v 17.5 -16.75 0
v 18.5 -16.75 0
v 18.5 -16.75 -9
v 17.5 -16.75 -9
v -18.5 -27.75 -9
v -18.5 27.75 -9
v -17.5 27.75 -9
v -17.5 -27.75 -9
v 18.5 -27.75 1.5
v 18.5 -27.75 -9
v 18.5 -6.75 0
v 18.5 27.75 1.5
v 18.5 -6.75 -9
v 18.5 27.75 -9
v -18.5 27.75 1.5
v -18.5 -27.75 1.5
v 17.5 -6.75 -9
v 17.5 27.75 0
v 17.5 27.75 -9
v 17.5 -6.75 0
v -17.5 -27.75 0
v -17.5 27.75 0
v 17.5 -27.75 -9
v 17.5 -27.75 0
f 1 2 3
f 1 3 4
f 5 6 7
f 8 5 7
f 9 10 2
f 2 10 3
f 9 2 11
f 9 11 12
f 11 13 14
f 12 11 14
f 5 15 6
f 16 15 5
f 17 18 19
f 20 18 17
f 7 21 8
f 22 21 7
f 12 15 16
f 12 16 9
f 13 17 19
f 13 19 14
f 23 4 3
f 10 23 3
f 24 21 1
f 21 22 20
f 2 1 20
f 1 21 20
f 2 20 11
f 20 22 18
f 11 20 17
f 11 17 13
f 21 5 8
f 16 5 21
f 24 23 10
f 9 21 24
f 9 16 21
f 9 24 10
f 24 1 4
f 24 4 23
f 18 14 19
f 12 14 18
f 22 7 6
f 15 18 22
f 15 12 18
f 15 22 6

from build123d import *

# Parameters (mm, degrees)
F0_W     = 1
F0_H     = 10
F1_DEPTH = 1.5
F2_DEPTH = 9


with BuildPart() as f1:
    # F0 (on Top) → F1 (new body)
    with BuildSketch(Plane.XY):
        Polygon((-17.5, 26.75), (0, 26.75), (17.5, 26.75), (17.5, 27.75), (0, 27.75), (-17.5, 27.75), align=None)
        Polygon((-17.5, 0), (-17.5, 26.75), (-17.5, 27.75), (-18.5, 27.75), (-18.5, -27.75), (-17.5, -27.75), (-17.5, -26.75), align=None)
        Polygon((17.5, 26.75), (0, 26.75), (-17.5, 26.75), (-17.5, 0), (-17.5, -26.75), (0, -26.75), (17.5, -26.75), (17.5, -16.75), (17.5, -6.75), (17.5, 0), align=None)
        Polygon((0, -26.75), (-17.5, -26.75), (-17.5, -27.75), (0, -27.75), (17.5, -27.75), (17.5, -26.75), align=None)
        Polygon((17.5, 27.75), (17.5, 26.75), (17.5, 0), (17.5, -6.75), (18.5, -6.75), (18.5, 27.75), align=None)
        Polygon((18.5, -16.75), (17.5, -16.75), (17.5, -26.75), (17.5, -27.75), (18.5, -27.75), align=None)
        with Locations((18, -11.75)):
            Rectangle(F0_W, F0_H)
    extrude(amount=F1_DEPTH)

    # F0 (on Top) → F2 (join)
    with BuildSketch(Plane.XY):
        Polygon((-17.5, 0), (-17.5, 26.75), (-17.5, 27.75), (-18.5, 27.75), (-18.5, -27.75), (-17.5, -27.75), (-17.5, -26.75), align=None)
        Polygon((17.5, 27.75), (17.5, 26.75), (17.5, 0), (17.5, -6.75), (18.5, -6.75), (18.5, 27.75), align=None)
        Polygon((18.5, -16.75), (17.5, -16.75), (17.5, -26.75), (17.5, -27.75), (18.5, -27.75), align=None)
    extrude(amount=-F2_DEPTH)


solid = f1.part
